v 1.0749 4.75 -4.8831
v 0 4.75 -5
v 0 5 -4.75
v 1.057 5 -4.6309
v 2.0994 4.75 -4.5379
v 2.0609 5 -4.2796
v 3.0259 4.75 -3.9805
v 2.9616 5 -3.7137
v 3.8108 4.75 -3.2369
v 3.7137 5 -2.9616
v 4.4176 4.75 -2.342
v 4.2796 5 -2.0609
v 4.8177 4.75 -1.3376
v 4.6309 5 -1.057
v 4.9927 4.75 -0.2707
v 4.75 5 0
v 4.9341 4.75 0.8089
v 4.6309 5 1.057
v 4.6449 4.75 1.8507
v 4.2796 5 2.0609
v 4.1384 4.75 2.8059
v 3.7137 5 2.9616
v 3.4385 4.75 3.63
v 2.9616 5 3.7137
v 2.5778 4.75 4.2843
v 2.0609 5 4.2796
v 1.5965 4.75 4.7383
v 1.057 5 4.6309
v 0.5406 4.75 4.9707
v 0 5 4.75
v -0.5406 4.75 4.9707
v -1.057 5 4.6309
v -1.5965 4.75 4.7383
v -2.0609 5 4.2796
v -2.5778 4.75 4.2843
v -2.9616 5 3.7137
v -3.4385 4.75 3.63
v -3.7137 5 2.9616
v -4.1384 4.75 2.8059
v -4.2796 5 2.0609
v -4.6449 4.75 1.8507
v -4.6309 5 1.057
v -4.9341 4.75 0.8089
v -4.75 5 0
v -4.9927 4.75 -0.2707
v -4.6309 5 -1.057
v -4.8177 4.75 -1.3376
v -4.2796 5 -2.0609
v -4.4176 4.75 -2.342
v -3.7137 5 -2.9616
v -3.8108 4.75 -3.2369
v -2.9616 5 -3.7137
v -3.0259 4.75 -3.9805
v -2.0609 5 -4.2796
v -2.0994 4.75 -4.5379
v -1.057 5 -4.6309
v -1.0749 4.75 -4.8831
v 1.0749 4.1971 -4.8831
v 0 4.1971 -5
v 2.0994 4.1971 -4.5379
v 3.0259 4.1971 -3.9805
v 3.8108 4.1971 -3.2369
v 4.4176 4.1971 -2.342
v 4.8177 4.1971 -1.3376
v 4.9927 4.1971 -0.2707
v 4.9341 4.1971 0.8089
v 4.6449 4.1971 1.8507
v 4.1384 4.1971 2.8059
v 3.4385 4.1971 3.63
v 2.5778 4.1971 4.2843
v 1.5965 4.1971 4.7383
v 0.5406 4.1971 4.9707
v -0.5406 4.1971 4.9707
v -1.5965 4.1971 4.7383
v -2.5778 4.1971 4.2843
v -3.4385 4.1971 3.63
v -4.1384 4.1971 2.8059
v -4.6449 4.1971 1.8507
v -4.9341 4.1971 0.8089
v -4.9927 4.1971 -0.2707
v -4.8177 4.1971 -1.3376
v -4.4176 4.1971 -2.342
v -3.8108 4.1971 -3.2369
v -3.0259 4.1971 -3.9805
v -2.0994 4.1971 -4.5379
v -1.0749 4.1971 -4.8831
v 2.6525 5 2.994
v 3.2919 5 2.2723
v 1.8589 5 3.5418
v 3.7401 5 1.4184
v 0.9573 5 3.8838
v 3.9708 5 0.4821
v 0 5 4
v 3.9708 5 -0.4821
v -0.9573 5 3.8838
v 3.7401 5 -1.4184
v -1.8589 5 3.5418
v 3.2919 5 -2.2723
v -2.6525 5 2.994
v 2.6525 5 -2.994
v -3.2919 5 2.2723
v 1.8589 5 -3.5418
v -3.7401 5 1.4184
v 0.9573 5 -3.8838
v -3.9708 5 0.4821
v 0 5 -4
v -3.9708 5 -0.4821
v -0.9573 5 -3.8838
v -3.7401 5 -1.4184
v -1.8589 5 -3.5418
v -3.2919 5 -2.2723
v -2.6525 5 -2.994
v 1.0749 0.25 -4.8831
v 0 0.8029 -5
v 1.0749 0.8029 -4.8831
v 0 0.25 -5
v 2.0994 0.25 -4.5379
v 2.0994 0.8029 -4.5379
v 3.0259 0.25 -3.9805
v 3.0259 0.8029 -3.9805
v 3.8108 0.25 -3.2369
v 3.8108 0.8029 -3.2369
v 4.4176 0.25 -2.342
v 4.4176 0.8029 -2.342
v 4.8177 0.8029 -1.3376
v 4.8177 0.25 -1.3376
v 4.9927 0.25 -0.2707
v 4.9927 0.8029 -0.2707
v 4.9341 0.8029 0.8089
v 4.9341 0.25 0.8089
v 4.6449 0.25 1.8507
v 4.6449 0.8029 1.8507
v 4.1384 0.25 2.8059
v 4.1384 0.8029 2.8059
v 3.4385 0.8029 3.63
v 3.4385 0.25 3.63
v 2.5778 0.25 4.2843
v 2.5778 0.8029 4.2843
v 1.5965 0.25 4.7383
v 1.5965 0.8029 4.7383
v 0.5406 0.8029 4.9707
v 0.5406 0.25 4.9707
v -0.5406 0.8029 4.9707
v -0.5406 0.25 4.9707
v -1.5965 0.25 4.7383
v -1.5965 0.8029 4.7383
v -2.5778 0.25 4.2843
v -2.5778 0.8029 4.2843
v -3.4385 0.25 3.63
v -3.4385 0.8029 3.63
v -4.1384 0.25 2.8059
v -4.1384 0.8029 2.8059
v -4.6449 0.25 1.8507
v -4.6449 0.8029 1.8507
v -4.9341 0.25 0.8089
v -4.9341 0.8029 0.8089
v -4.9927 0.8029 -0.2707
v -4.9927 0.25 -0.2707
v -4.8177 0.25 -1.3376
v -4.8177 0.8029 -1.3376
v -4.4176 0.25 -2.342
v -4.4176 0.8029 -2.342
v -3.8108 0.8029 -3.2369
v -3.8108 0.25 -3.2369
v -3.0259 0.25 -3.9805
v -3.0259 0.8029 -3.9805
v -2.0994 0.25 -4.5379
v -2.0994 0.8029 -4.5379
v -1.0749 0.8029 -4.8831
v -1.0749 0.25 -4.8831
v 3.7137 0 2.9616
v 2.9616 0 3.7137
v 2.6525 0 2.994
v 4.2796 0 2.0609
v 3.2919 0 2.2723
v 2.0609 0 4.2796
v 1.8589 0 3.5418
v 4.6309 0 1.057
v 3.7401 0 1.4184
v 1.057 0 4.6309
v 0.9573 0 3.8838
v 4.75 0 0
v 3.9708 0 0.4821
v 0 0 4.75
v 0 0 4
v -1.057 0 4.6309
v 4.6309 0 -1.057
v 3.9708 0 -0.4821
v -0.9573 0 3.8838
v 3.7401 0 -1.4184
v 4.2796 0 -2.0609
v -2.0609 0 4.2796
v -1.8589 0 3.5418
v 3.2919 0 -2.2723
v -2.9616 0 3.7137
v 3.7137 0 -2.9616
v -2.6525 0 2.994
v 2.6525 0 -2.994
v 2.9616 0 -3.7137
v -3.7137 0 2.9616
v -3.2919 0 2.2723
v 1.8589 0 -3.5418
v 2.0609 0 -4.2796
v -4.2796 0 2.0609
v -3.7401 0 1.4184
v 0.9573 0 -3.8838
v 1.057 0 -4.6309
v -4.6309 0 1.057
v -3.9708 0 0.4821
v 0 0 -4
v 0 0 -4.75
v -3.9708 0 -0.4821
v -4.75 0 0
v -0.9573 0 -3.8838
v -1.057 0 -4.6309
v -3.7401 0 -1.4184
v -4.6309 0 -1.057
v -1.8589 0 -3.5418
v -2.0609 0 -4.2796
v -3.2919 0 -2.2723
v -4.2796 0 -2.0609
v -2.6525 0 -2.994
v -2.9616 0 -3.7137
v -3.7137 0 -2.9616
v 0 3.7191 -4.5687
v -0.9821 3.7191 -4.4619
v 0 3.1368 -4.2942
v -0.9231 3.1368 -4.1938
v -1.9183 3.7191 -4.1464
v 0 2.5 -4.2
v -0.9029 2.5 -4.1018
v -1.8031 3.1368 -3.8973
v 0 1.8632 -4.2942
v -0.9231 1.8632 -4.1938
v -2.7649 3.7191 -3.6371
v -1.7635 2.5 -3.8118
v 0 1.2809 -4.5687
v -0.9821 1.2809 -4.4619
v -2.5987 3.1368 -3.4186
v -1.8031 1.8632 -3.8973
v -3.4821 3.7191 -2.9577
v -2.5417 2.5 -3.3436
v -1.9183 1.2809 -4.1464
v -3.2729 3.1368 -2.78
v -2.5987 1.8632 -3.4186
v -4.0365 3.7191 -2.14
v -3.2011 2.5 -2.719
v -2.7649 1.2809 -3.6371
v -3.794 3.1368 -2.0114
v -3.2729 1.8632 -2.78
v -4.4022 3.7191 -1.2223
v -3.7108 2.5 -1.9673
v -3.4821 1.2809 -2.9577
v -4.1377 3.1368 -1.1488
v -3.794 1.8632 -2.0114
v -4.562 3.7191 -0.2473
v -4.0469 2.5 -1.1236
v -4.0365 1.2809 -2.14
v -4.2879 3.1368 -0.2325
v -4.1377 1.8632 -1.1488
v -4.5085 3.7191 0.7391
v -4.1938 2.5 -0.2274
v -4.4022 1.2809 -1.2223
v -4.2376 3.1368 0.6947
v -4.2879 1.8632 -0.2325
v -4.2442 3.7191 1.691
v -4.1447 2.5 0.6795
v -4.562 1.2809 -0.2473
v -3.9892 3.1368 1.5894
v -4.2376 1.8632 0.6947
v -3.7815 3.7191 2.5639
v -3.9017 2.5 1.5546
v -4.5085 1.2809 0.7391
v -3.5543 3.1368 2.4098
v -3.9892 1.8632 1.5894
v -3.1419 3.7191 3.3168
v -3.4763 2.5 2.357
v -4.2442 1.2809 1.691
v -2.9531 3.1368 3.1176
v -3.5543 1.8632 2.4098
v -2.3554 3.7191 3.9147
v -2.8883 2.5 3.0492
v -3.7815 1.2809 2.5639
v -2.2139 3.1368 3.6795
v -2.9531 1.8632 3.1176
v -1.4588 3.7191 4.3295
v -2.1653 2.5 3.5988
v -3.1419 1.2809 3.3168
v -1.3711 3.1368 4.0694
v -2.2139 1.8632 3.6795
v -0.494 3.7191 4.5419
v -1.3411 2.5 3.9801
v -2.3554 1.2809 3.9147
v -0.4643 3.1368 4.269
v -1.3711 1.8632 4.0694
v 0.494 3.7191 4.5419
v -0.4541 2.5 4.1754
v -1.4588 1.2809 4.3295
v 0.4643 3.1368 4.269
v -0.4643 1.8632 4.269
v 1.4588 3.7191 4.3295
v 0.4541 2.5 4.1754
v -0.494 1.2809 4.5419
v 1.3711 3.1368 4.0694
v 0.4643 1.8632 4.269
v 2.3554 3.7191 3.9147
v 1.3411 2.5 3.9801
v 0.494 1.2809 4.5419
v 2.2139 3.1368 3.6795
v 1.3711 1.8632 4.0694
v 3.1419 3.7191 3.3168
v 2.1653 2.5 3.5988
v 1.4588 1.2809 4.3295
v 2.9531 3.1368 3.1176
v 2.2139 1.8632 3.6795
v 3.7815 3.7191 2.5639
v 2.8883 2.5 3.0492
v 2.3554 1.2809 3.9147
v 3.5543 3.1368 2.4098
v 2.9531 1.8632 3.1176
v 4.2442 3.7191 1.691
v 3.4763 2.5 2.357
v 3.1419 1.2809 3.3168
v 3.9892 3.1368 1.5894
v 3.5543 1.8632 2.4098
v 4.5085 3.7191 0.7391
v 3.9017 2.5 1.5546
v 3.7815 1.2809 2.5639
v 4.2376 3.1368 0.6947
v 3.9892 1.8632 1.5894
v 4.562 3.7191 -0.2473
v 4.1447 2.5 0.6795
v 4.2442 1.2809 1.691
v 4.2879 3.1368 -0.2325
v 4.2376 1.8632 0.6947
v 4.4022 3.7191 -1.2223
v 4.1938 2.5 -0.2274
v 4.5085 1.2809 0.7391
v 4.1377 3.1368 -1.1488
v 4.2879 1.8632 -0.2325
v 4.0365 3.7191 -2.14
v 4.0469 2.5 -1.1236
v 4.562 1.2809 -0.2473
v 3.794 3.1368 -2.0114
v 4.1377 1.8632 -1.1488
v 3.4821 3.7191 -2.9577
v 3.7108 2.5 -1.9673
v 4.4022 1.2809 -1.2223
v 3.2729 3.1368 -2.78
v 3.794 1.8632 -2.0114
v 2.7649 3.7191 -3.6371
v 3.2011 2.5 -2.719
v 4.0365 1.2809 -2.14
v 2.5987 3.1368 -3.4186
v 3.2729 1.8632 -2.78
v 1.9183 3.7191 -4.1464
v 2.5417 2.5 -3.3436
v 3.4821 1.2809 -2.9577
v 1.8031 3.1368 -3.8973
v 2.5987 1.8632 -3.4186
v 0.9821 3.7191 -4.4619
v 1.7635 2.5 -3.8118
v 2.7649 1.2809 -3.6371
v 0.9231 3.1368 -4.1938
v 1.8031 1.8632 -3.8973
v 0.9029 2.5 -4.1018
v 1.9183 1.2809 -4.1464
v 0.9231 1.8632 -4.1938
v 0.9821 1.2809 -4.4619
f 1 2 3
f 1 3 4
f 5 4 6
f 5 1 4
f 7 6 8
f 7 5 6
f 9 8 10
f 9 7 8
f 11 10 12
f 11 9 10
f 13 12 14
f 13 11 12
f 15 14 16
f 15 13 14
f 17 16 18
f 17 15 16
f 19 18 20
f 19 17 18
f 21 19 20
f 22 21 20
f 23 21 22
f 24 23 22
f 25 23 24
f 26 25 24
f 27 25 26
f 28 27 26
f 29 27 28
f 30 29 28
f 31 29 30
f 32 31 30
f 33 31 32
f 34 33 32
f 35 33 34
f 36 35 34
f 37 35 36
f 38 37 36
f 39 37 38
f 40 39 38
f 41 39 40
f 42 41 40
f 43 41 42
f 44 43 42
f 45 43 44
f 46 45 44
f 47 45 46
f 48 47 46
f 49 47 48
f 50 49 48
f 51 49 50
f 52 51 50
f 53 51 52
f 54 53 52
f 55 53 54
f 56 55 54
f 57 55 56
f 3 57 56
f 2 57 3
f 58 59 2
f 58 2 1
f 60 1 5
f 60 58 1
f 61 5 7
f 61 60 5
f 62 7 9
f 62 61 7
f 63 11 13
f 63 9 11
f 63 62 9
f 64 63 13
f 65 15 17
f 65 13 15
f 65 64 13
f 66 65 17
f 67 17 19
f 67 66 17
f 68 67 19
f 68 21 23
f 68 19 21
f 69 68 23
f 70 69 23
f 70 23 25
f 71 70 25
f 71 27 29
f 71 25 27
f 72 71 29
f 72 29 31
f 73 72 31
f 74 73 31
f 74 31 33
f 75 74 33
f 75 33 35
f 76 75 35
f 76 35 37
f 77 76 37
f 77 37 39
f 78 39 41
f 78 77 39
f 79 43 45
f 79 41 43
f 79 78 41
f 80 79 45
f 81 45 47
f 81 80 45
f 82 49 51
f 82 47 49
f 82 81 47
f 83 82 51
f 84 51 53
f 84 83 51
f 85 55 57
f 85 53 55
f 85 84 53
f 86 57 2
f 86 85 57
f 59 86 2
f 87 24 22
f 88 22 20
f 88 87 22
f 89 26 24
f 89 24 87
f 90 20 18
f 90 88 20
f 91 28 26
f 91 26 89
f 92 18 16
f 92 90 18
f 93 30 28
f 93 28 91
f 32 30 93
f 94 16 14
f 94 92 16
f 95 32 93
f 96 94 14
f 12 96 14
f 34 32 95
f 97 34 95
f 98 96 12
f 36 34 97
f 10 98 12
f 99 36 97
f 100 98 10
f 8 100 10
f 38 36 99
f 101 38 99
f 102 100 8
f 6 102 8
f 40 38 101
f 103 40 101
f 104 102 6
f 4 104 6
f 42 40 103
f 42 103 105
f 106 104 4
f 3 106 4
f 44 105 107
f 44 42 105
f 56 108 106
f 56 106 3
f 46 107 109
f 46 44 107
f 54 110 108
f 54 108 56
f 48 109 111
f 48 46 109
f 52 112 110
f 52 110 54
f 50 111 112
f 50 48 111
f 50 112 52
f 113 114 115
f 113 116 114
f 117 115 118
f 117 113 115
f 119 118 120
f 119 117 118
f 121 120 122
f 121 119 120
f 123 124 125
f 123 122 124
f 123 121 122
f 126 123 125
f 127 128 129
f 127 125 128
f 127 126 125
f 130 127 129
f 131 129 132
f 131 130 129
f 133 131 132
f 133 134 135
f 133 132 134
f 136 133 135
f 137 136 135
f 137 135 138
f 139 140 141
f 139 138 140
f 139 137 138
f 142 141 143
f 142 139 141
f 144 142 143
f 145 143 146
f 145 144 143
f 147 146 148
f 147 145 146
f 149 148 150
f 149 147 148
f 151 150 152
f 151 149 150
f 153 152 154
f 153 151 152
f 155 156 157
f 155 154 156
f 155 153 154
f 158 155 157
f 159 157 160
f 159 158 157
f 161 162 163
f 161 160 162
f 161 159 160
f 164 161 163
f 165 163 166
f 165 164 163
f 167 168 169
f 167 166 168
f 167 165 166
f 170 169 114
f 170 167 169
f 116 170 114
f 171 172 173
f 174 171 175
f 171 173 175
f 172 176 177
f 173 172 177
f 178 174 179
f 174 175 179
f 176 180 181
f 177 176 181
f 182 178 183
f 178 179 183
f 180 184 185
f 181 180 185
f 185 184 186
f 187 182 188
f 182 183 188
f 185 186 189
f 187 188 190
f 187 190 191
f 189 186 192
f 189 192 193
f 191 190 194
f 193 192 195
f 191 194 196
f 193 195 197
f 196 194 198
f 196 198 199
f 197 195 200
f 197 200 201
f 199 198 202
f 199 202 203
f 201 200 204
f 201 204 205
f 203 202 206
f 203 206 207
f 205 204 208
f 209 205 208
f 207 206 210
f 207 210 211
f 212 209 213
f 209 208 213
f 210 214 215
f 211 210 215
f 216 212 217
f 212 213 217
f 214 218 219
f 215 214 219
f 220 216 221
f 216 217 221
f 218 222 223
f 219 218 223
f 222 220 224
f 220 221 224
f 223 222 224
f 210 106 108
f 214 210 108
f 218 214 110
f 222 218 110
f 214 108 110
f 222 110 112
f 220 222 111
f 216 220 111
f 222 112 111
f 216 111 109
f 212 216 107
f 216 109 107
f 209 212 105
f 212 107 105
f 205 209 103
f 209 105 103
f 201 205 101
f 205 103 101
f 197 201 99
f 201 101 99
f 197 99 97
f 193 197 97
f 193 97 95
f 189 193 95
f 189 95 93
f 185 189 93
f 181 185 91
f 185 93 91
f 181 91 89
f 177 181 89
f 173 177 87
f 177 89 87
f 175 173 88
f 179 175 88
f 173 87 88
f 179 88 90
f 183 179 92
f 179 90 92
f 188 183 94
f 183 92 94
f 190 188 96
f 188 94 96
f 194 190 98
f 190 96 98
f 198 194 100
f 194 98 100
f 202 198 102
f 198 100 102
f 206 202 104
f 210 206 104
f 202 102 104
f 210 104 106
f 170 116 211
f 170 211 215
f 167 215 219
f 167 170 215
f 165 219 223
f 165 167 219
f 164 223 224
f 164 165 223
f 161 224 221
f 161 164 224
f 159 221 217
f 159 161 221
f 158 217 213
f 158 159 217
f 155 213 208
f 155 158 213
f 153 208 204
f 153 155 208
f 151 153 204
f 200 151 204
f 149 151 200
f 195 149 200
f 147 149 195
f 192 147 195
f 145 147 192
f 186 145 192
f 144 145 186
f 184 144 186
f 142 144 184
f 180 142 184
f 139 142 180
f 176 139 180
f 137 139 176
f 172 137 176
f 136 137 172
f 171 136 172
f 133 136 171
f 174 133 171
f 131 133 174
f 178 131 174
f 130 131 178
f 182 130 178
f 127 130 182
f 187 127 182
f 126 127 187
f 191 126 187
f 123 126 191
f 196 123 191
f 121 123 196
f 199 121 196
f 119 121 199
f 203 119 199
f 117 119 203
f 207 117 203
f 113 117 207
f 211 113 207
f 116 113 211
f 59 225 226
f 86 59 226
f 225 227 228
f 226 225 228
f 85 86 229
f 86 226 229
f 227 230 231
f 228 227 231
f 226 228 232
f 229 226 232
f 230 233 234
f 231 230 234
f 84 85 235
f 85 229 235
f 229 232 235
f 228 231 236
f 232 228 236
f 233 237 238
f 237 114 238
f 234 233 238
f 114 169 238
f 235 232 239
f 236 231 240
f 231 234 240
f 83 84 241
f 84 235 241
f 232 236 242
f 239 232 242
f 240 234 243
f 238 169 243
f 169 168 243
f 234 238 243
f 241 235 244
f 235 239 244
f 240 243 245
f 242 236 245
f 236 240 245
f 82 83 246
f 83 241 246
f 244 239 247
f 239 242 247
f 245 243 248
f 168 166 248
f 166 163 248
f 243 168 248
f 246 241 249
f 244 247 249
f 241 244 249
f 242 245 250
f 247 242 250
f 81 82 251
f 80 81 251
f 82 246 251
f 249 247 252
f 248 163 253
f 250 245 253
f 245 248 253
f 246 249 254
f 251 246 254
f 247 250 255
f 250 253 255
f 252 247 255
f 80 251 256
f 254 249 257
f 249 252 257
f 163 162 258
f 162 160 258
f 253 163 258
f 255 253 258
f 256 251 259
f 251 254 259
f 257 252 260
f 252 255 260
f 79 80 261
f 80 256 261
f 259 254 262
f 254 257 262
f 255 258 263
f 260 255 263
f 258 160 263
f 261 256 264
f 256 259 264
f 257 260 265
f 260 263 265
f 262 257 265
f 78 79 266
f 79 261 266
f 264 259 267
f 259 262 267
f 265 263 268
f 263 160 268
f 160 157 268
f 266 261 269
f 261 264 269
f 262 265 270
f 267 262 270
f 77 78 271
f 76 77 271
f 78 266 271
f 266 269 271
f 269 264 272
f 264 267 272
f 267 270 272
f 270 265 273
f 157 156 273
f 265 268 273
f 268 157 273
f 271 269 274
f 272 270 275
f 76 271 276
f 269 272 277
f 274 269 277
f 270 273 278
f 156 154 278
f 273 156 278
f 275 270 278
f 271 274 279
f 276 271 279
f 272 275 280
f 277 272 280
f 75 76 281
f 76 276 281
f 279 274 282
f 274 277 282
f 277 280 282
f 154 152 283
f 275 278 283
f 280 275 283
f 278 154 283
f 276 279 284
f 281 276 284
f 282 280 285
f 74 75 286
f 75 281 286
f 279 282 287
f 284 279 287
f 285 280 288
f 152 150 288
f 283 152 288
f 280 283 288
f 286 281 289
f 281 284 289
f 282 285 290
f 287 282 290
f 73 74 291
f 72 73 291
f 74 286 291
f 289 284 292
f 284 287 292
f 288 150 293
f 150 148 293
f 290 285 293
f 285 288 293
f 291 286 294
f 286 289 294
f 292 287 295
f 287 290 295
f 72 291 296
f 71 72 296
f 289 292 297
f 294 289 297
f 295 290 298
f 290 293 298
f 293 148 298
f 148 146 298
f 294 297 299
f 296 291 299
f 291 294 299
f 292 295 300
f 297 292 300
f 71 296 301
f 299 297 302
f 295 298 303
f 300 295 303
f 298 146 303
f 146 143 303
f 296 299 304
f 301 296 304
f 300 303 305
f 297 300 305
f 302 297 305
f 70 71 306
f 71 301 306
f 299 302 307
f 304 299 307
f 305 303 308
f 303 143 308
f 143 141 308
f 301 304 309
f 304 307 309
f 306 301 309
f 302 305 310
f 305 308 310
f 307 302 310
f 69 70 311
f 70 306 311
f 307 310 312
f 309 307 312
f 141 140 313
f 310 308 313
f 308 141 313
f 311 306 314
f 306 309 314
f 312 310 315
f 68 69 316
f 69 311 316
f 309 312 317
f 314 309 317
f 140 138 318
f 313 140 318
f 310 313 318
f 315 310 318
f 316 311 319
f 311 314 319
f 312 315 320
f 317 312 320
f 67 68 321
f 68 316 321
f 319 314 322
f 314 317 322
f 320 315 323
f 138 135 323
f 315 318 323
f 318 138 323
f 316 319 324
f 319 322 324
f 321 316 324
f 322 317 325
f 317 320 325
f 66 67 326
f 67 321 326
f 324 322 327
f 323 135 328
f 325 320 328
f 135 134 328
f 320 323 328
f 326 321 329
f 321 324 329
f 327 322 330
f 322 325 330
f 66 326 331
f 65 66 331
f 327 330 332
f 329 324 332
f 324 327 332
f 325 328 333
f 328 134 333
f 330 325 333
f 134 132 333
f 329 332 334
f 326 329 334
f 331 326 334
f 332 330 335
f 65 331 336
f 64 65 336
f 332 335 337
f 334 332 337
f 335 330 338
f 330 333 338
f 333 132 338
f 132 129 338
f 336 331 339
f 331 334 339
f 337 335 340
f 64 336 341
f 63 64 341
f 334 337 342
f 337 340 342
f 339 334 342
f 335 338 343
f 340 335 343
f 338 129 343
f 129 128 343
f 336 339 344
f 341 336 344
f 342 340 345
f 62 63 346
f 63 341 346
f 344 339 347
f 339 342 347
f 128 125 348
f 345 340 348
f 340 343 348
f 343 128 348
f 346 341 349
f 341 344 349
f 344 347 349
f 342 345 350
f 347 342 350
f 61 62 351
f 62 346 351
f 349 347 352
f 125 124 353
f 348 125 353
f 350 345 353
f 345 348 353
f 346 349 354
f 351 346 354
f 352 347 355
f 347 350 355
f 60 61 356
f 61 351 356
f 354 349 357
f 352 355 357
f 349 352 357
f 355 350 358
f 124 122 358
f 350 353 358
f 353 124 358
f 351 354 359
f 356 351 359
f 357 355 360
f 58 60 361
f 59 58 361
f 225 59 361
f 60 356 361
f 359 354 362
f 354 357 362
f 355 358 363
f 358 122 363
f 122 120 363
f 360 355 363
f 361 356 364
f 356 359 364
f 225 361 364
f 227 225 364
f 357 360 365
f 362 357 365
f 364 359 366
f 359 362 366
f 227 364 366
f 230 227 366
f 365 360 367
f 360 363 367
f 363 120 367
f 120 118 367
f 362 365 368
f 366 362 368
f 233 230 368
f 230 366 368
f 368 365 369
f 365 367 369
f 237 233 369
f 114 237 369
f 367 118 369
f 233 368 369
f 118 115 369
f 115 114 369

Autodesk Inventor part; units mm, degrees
ref_plane "YZ Plane" through (0, 0, 0) normal (1, 0, 0) x (0, 1, 0)
ref_plane "XZ Plane" through (0, 0, 0) normal (0, 1, 0) x (-1, 0, 0)
ref_plane "XY Plane" through (0, 0, 0) normal (0, 0, 1) x (1, 0, 0)
sketch "Sketch1" plane through (0, 0, 0) normal (1, 0, 0) x (0, 1, 0)
  line L0 (0, 0) -> (7, 0)
  line L1 (0, 0) -> (0, -15) construction
  line L2 (0, -4) -> (5, -4)
  line L3 (5, -4) -> (5, -5)
  line L4 (5, -5) -> (0, -5)
  line L5 (0, -5) -> (0, -4)
  circle A0 centre (2.5, -6.4) radius 2.2
  line L6 (2.5, 0) -> (2.5, -6.4) construction
  point P0 (0.8029, -5)
  point P1 (4.1971, -5)
  dimension "d2" = 7
  dimension "d3" = 15
  dimension "d4" = 5
  dimension "d5" = 8
  dimension "d6" = 4.4
  dimension "d7" = 2.5
  dimension "d8" = 1.4
  dimension "d9" = 1
revolve "Revolution1" add sketch "Sketch1" angle 360 about axis through (0, 0, 0) along (0, 1, 0) contours L2 L3 L4 A0 L5
chamfer "Chamfer1" distance 0.25 angle 45 2 edges at (0, 5, 5) (0, 0, 5)
properties part number "Inner_Ring"
